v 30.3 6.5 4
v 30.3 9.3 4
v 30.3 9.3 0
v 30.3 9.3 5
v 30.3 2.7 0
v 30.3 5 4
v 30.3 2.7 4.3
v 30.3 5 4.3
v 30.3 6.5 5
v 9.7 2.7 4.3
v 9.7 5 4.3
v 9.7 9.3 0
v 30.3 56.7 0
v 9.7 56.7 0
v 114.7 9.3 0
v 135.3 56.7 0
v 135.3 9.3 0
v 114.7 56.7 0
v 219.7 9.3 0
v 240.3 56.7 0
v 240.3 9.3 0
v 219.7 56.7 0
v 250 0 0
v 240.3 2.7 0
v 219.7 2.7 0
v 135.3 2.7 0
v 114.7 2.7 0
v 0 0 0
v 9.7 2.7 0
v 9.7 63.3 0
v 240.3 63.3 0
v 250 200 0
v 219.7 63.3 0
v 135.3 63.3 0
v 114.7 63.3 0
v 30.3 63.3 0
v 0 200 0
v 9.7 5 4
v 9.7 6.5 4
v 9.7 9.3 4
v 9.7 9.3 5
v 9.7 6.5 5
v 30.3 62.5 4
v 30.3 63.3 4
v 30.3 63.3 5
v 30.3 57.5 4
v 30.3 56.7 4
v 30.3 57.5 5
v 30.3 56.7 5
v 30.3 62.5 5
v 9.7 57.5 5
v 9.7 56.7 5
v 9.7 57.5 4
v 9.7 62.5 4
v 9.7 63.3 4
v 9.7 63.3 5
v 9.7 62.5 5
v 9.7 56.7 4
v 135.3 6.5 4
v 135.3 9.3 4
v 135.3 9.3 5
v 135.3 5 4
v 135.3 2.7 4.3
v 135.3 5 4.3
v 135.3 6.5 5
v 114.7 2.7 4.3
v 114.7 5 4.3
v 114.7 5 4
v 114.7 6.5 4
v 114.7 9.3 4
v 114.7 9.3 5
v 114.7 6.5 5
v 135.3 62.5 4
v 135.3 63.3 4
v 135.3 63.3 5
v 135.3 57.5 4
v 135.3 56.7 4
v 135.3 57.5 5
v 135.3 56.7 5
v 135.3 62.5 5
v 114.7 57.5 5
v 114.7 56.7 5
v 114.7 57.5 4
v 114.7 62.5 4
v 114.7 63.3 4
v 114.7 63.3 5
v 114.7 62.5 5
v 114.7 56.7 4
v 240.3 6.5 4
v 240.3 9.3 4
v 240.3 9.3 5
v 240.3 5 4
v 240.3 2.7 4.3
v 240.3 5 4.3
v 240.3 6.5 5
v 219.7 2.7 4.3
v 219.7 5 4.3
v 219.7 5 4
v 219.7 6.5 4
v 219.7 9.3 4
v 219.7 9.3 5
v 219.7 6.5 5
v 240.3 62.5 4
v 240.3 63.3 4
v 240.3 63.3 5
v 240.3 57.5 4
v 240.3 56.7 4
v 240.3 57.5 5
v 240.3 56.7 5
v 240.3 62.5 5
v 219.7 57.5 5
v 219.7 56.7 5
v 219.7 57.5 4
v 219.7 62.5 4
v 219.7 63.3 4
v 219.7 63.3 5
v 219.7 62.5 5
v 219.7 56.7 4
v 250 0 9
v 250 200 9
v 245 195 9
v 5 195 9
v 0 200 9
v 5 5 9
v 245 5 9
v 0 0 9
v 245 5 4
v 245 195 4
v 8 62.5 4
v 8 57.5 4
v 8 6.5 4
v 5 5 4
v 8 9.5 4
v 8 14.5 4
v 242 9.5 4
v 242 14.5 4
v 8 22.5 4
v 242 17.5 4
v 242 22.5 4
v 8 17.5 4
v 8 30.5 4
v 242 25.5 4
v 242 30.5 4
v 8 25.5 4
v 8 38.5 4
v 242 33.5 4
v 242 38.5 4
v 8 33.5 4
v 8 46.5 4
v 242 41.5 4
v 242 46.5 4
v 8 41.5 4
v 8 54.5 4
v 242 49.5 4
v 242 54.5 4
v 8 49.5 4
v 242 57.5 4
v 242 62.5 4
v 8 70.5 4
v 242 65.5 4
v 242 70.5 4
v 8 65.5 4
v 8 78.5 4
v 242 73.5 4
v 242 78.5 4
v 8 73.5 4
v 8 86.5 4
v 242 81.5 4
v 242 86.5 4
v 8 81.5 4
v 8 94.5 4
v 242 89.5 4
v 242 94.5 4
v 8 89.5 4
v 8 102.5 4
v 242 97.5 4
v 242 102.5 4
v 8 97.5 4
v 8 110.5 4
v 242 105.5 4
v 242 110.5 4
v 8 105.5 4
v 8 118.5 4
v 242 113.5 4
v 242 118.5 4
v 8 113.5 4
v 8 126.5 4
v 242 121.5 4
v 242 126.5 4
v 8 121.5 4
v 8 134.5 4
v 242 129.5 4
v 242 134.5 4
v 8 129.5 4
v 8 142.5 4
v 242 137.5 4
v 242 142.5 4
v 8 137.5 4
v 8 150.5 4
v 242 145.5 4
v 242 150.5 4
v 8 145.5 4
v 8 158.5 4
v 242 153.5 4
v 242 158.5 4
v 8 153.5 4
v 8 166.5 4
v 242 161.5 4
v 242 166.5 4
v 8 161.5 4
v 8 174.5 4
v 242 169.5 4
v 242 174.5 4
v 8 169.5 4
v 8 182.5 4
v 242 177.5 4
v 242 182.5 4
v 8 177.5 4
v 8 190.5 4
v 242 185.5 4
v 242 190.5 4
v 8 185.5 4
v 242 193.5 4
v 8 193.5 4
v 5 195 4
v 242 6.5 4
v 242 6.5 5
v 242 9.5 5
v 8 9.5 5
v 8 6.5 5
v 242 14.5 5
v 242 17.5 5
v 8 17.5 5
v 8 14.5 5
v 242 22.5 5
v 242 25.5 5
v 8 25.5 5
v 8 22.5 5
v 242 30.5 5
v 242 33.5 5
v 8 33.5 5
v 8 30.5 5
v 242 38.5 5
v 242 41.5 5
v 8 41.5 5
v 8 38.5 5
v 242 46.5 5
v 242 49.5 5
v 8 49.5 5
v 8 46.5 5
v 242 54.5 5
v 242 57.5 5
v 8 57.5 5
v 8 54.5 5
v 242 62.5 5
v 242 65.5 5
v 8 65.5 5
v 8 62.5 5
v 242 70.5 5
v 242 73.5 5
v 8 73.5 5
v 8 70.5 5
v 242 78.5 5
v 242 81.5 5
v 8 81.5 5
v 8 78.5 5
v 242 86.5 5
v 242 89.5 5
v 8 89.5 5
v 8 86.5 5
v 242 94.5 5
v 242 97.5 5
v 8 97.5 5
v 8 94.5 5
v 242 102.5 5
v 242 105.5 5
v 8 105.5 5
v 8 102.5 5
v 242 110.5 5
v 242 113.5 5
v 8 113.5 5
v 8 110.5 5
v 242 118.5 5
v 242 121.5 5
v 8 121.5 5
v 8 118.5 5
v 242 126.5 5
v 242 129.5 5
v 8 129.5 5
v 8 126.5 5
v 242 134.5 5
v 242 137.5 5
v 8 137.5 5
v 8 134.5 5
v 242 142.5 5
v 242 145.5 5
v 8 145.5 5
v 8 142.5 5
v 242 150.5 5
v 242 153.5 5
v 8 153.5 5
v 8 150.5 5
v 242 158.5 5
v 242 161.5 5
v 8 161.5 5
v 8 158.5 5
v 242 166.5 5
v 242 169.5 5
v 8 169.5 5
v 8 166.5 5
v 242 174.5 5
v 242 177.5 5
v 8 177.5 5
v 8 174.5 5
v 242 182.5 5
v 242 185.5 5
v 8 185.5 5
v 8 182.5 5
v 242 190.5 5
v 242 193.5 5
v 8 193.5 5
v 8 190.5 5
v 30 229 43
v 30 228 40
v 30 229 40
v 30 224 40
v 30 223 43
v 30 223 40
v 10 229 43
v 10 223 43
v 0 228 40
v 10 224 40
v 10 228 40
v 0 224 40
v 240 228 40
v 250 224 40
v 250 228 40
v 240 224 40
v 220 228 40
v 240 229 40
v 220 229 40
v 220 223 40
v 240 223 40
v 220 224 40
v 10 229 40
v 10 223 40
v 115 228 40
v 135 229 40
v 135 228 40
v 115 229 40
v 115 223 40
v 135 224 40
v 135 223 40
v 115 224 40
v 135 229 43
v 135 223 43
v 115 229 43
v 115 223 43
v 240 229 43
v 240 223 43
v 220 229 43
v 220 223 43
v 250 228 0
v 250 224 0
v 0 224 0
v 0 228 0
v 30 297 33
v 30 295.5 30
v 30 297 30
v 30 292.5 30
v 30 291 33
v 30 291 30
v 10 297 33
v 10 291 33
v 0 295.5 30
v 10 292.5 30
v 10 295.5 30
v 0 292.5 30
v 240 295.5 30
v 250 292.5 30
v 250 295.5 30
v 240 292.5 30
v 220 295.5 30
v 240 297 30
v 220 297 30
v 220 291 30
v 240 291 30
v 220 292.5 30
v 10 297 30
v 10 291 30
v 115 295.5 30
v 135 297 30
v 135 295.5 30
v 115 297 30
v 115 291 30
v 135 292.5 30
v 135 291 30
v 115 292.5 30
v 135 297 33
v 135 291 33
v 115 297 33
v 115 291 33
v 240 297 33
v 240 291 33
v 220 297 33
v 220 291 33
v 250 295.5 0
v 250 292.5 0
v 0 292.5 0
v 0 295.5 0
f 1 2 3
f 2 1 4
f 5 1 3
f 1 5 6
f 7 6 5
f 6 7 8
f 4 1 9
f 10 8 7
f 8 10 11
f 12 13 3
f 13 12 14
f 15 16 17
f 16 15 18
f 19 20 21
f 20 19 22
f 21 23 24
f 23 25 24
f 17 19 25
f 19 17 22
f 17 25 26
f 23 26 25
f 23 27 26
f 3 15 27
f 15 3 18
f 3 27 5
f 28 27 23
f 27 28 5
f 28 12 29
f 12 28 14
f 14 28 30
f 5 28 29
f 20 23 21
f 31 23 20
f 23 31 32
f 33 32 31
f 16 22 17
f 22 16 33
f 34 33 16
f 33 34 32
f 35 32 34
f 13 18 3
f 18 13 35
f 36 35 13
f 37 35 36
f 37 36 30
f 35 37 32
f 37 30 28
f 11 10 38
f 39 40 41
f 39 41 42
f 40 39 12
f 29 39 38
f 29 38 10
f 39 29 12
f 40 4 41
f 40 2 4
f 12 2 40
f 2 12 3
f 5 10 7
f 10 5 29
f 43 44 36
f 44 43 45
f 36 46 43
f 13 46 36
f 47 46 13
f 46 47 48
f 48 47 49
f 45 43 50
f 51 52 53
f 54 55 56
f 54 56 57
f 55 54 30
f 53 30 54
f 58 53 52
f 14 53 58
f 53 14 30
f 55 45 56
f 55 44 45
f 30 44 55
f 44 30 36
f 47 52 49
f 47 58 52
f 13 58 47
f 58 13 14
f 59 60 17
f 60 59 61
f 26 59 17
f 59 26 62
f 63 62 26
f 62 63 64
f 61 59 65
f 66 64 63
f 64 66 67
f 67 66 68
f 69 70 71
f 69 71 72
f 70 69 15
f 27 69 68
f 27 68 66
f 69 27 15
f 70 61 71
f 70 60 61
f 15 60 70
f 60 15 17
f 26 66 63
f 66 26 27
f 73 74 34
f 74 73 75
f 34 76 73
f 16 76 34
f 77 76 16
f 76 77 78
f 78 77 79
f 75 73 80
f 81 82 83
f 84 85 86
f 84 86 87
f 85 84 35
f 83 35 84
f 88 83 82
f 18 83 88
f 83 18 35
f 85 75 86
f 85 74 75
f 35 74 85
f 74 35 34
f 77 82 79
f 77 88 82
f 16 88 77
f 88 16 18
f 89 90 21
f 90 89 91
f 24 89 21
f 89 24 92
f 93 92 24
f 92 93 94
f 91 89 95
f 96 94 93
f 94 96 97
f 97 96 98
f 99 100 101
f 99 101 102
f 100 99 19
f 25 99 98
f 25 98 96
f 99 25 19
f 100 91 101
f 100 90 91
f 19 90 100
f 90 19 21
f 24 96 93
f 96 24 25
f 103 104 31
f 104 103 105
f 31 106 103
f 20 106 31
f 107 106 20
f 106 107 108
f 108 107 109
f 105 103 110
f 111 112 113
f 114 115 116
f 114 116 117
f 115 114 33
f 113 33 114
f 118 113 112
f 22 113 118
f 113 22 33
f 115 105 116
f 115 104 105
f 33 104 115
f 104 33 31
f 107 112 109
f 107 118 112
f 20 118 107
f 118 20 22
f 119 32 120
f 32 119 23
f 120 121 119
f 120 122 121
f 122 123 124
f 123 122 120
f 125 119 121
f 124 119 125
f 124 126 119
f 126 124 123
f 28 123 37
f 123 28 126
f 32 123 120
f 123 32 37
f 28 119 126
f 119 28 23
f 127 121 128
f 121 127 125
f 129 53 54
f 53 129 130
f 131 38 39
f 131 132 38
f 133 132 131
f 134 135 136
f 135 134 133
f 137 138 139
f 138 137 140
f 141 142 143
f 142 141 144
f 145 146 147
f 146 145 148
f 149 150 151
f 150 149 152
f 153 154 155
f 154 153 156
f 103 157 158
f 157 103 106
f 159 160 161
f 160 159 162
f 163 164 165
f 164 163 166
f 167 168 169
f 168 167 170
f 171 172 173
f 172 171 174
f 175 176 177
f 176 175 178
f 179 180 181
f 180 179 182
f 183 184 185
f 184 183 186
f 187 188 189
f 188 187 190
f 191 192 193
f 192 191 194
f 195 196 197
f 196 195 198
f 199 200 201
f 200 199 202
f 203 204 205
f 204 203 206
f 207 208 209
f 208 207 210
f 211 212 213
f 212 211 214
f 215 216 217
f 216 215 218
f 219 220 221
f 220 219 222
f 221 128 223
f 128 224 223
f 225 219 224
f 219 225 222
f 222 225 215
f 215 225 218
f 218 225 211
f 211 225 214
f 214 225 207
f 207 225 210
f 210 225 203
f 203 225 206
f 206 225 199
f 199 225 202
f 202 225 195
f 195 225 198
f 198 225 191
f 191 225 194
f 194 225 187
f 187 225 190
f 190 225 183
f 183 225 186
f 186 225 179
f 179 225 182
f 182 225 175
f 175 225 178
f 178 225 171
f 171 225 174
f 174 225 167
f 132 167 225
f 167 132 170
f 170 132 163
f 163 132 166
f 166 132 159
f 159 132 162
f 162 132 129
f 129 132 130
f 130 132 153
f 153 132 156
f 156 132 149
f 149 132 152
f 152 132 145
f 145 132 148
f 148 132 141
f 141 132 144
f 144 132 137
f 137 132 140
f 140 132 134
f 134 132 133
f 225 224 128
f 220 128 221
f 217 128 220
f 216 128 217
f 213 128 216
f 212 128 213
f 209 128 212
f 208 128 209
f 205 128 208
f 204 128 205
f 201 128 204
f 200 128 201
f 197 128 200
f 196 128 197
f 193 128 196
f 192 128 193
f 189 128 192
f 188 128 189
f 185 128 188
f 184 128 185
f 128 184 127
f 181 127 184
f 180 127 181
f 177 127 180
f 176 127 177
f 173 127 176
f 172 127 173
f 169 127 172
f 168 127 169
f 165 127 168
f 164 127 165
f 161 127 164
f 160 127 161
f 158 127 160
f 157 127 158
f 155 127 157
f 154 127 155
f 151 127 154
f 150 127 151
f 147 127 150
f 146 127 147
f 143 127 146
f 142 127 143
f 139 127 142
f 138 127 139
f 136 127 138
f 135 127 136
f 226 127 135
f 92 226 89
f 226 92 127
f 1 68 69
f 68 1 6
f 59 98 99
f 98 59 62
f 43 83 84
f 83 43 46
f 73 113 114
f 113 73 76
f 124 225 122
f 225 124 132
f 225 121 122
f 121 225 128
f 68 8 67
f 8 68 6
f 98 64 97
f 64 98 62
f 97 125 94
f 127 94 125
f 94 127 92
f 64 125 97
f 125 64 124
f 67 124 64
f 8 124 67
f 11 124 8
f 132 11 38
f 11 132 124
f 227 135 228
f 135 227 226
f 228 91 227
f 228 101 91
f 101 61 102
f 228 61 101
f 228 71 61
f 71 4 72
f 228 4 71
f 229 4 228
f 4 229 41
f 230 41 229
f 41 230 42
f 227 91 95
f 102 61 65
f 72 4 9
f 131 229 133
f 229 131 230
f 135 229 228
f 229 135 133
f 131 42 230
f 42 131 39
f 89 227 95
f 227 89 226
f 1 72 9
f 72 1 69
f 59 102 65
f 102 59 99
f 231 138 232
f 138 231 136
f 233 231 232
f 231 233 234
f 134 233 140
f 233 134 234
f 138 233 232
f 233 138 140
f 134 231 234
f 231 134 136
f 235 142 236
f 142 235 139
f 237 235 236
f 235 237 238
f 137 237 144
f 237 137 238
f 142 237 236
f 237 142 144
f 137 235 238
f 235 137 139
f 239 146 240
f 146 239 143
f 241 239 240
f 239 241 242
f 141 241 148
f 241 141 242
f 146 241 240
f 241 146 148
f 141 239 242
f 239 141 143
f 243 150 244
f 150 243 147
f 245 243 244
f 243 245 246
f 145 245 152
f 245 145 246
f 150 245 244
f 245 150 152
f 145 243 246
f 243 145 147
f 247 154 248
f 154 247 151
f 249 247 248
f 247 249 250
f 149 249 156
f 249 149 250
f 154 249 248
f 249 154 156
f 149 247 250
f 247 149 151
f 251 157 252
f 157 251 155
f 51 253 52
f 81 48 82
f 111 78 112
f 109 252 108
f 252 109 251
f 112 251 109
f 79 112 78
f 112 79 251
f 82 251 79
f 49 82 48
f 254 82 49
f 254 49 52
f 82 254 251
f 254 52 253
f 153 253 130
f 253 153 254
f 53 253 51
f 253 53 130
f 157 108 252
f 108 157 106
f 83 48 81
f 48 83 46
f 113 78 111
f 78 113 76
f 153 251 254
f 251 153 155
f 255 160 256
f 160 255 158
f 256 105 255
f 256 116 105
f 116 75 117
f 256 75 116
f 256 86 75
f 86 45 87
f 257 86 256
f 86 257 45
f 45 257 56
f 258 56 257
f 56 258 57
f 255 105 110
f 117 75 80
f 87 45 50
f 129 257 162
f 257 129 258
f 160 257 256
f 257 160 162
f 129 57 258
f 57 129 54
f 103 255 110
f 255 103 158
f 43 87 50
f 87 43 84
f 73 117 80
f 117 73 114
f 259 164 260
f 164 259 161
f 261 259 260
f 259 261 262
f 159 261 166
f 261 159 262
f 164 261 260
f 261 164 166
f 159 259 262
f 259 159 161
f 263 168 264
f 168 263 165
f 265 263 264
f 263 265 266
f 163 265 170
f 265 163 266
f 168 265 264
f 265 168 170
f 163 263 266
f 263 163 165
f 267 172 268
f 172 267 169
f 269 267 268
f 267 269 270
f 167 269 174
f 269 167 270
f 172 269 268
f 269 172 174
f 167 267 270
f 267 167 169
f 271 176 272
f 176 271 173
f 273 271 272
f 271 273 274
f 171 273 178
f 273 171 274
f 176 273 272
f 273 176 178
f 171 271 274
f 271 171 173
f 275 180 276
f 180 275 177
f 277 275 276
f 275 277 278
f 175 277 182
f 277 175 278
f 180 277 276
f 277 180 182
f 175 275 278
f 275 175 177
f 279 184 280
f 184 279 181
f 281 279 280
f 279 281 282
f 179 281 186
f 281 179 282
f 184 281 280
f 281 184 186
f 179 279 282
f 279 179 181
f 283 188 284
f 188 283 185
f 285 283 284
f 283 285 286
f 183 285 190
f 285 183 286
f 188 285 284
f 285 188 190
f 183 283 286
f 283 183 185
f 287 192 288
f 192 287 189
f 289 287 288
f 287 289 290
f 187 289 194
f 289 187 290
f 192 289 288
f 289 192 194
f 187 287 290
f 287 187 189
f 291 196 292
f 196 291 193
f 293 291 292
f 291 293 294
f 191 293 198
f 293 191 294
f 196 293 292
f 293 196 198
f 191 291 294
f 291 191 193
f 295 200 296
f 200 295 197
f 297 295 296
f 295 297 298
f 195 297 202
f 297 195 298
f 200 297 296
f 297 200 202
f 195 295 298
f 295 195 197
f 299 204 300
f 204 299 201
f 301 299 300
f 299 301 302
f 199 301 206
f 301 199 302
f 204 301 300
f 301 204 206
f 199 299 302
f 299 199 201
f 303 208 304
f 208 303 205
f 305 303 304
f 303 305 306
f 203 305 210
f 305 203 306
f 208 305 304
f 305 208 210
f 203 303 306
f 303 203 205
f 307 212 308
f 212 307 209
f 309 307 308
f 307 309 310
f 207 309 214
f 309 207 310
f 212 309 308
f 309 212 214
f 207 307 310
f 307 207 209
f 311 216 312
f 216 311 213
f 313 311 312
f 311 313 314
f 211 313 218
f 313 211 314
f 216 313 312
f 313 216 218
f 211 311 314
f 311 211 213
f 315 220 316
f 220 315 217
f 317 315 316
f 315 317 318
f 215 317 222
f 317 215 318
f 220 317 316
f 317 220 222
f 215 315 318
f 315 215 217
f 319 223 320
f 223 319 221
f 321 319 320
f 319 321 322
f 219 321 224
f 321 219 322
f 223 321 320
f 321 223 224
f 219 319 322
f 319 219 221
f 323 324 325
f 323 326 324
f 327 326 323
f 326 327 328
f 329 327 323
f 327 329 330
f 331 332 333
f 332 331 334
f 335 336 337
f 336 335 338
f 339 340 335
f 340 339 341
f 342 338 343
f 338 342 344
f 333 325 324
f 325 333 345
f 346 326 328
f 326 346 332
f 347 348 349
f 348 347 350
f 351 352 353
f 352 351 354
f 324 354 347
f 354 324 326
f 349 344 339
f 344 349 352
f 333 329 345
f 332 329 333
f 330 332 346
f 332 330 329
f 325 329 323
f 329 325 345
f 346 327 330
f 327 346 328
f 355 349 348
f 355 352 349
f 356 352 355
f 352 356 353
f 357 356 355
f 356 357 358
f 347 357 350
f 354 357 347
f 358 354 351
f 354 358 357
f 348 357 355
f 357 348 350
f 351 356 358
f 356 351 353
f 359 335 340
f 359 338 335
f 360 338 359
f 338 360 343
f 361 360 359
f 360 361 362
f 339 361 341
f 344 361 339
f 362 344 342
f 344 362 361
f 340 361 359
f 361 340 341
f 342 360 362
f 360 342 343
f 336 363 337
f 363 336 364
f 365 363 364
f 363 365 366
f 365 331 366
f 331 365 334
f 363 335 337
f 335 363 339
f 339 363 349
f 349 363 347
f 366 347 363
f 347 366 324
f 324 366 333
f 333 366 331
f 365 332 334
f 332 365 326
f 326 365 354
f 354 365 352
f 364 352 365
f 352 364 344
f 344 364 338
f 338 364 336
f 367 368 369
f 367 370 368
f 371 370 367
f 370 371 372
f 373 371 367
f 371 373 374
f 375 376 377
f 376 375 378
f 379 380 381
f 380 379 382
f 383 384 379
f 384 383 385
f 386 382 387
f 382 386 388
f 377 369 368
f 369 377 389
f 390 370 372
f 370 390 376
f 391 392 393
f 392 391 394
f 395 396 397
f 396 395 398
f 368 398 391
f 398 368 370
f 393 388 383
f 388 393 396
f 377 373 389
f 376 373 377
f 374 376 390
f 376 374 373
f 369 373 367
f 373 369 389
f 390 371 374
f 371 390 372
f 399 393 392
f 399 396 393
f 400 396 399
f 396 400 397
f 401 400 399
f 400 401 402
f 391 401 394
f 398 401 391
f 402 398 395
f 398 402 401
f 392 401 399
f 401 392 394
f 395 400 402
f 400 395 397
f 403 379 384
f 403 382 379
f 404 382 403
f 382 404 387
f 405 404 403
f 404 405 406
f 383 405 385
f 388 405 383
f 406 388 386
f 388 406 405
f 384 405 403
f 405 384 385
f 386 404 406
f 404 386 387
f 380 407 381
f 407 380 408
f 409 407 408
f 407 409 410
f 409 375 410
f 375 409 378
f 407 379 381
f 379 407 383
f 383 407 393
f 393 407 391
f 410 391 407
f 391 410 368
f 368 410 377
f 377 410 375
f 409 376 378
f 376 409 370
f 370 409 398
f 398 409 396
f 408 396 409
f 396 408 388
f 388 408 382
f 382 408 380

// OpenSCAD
// file: BOSL2/std.scad
// Minimal BOSL2 compatibility shim for bundled gallery models.
// It implements only the helpers used by the imported OpenSCAD projects.

CENTER = [0, 0, 0];
BOTTOM = [0, 0, -1];
TOP = [0, 0, 1];
LEFT = [-1, 0, 0];
RIGHT = [1, 0, 0];
FRONT = [0, -1, 0];
BACK = [0, 1, 0];

module up(z=0) {
    translate([0, 0, z]) children();
}

module down(z=0) {
    translate([0, 0, -z]) children();
}

module attach(anchor=CENTER) {
    children();
}

module cuboid(size=[1, 1, 1], anchor=CENTER) {
    center = anchor == CENTER;
    translate(center ? [0, 0, 0] : [0, 0, size[2] / 2])
        cube(size, center=true);
    children();
}

module xcyl(h=1, r=1, anchor=CENTER) {
    center = anchor == CENTER;
    translate(center ? [0, 0, 0] : [h / 2, 0, 0])
        rotate([0, 90, 0])
            cylinder(h=h, r=r, center=true);
}
// main file
// BOSL2 für sauberes Rounding
include <BOSL2/std.scad>;

//
// Wohnmobil-Fensterbank
// - Oben: Platte + optional umlaufender Rand + BOSL2-Rundung oben an allen 4 Außenkanten
// - Oben: optional Anti-Rutsch-Rifflung auf der Grundfläche (ohne die Stecklöcher)
// - Unten: zwei Brackets zum Einstecken (mit Steck-Clips + Löchern in der Platte)
// - Brackets optional abnehmbar für optimalen Druck
// Alle Maße in mm
//

// ---------------- Basismaße ----------------

// Unterplatte
shelf_width        = 250;   // Breite (X)
shelf_depth        = 200;   // Tiefe (Y)
shelf_thickness    = 4;     // Dicke der Platte

// Umlaufender Rand auf der OBERSEITE
rim_enabled        = true;  // Rand an/aus
rim_height         = 5;     // Höhe des Randes über der Platte
rim_width          = 5;     // Breite des Randes nach innen

// BOSL2-Rundung (oben außen)
front_radius       = 6;     // 0 = keine Rundung, >0 = Radius an allen oberen Außenkanten

// Fensterbank, auf die aufgeklippt wird
board_thickness    = 50;    // Abstand zwischen den INNENflächen der beiden Halter
fit_clearance      = 0.5;   // Spiel für die Klemmung (additiv zur board_thickness)

// Äußerer Halter (fensterseitig)
outer_br_height    = 40;    // Höhe des Halters
outer_br_thickness = 4;     // Dicke in Y

// Innerer Halter (raumseitig)
inner_br_height    = 30;    // Höhe des Halters
inner_br_thickness = 3;     // Dicke in Y

// Anti-Rutsch-Rifflung
anti_slip_enabled    = true;  // Anti-Rutsch an/aus
anti_ridge_height    = 1.0;   // Höhe der Rillen über der Grundfläche
anti_ridge_width     = 3.0;   // Breite einer Rille in Y-Richtung
anti_ridge_spacing   = 8.0;   // Abstand von Rillenmitte zu Rillenmitte in Y-Richtung
anti_ridge_margin    = 3.0;   // Abstand zur Innenkante des Randes bzw. Plattenrand

// Brackets separat zum Drucken anordnen?
brackets_detached    = true;  // false = Brackets in Einbauposition, true = separat neben der Platte

// Steg hinten an der Platte, bevor die äußeren Löcher beginnen
back_steg            = 4.0;   // Materialstärke zwischen Plattenende (y=0) und Beginn des äußeren Brackets

// ---------------- Clips / Steckverbindung ----------------

// Anzahl der Stecknasen pro Bracket
plug_count           = 3;     // z.B. 2 oder 3

// Maße der Stecknasen (am Bracket)
plug_width_x         = 20;    // Länge der Nase in X-Richtung
plug_depth_y         = 6;     // Tiefe in Y-Richtung (in den Bracket hinein)
plug_height_z        = 3.0;   // Höhe der Nase, die in die Platte hineinragt

// Löcher in der Platte sind etwas größer:
plug_clearance       = 0.3;   // Toleranz (wird auf beide Seiten draufgeschlagen)
plug_margin_x        = 10.0;  // Abstand zu den Seiten in X


// =============================================================
// Abgeleitete Maße / gemeinsame Positionierungsfunktionen
// =============================================================

// FIX #1: innerer Bracket-Offset (korrigiert)
// Ziel: Abstand der INNENFLÄCHEN = board_thickness + fit_clearance
// Außenbracket liegt bei y = back_steg .. back_steg+outer_br_thickness
// Innenfläche außen = back_steg + outer_br_thickness
// Innenfläche innen = inner_y0
// => inner_y0 = back_steg + outer_br_thickness + board_thickness + fit_clearance
inner_y0 = back_steg + outer_br_thickness + board_thickness + fit_clearance;

// Gemeinsamer X-Schritt (zentriert über Plug-Geometrie, nicht über Loch-Geometrie)
step_x = (plug_count > 1)
  ? ( (shelf_width - 2*plug_margin_x - plug_width_x) / (plug_count - 1) )
  : 0;

// Gemeinsame X-Zentren der Plugs/Löcher
function x_center(i) = plug_margin_x + plug_width_x/2 + i*step_x;


// =============================================================
// Hilfs-Module: Stecklöcher / Stecknasen
// =============================================================

// Stecklöcher in der Platte (für beide Brackets)
module plug_holes() {
    // Hole-Höhe: komplett durch die Platte
    hole_h = shelf_thickness + 0.3;

    // Lochgrößen (mit Clearance)
    hole_w = plug_width_x  + 2*plug_clearance;
    hole_d = plug_depth_y  + 2*plug_clearance;

    // ---------- Äußerer Bracket: Löcher mit hinterem Steg ----------
    outer_y_center = back_steg + outer_br_thickness / 2;
    outer_y0_hole  = outer_y_center - hole_d/2;

    // ---------- Innerer Bracket ----------
    inner_y_center = inner_y0 + inner_br_thickness / 2;
    inner_y0_hole  = inner_y_center - hole_d/2;

    for (i = [0 : plug_count-1]) {
        xc = x_center(i);

        // Loch für äußeren Bracket (zentriert in X)
        translate([xc - hole_w/2, outer_y0_hole, 0])
            cube([hole_w, hole_d, hole_h], center = false);

        // Loch für inneren Bracket (zentriert in X)
        translate([xc - hole_w/2, inner_y0_hole, 0])
            cube([hole_w, hole_d, hole_h], center = false);
    }
}

// Maske für die Rillen: gleiche XY wie die Löcher, aber nur im Bereich der Anti-Slip-Höhe
module plug_holes_mask_for_ridges() {
    // Lochgrößen (mit Clearance), identisch wie in plug_holes()
    hole_w = plug_width_x  + 2*plug_clearance;
    hole_d = plug_depth_y  + 2*plug_clearance;

    outer_y_center = back_steg + outer_br_thickness / 2;
    outer_y0_hole  = outer_y_center - hole_d/2;

    inner_y_center = inner_y0 + inner_br_thickness / 2;
    inner_y0_hole  = inner_y_center - hole_d/2;

    // Maske nur im Bereich oberhalb der Platte, wo die Rillen sind
    top_z  = shelf_thickness;
    mask_h = anti_ridge_height + 1.0;  // etwas höher als die Rillen

    for (i = [0 : plug_count-1]) {
        xc = x_center(i);

        // Maskenblock über äußerem Loch
        translate([xc - hole_w/2, outer_y0_hole, top_z - 0.1])
            cube([hole_w, hole_d, mask_h], center = false);

        // Maskenblock über innerem Loch
        translate([xc - hole_w/2, inner_y0_hole, top_z - 0.1])
            cube([hole_w, hole_d, mask_h], center = false);
    }
}

// Stecknasen am äußeren Bracket (in Einbaukoordinaten)
module outer_bracket_plugs() {
    outer_y_center = back_steg + outer_br_thickness / 2;
    plug_y0        = outer_y_center - plug_depth_y / 2;

    for (i = [0 : plug_count-1]) {
        xc = x_center(i);
        translate([xc - plug_width_x/2, plug_y0, 0])
            cube([plug_width_x, plug_depth_y, plug_height_z], center = false);
    }
}

// Stecknasen am inneren Bracket (in Einbaukoordinaten)
module inner_bracket_plugs() {
    inner_y_center = inner_y0 + inner_br_thickness / 2;
    plug_y0        = inner_y_center - plug_depth_y / 2;

    for (i = [0 : plug_count-1]) {
        xc = x_center(i);
        translate([xc - plug_width_x/2, plug_y0, 0])
            cube([plug_width_x, plug_depth_y, plug_height_z], center = false);
    }
}


// =============================================================
// Grundplatte + Rand + Anti-Rutsch
// =============================================================

// Grundplatte + optionaler Rand, noch ohne Rundung, ohne Löcher
module flat_base_with_rim_raw() {

    // Platte
    cube([shelf_width, shelf_depth, shelf_thickness], center = false);

    // Rand auf der Oberseite (nur wenn aktiviert)
    if (rim_enabled && rim_height > 0 && rim_width > 0) {
        difference() {
            // äußerer Block für den Rand
            translate([0, 0, shelf_thickness])
                cube([shelf_width, shelf_depth, rim_height], center = false);

            // Innenbereich ausschneiden, damit nur der Ring stehen bleibt
            translate([rim_width, rim_width, shelf_thickness - 0.1])
                cube([shelf_width - 2*rim_width,
                      shelf_depth - 2*rim_width,
                      rim_height + 0.2], center = false);
        }
    }
}

// Anti-Rutsch-Rifflung auf der Grundfläche (oberhalb der Platte),
// aber ausgespart über den Stecklöchern.
module anti_slip_pattern() {
    if (anti_slip_enabled) {

        // Oberseite der Platte
        top_z = shelf_thickness;

        // Innenbereich definieren (umbenannt, damit inner_y0 für Bracket nicht überschattet wird)
        area_x0 = rim_enabled ? rim_width : 0;
        area_x1 = rim_enabled ? (shelf_width  - rim_width)  : shelf_width;
        area_y0 = rim_enabled ? rim_width : 0;
        area_y1 = rim_enabled ? (shelf_depth - rim_width) : shelf_depth;

        area_w  = area_x1 - area_x0;
        area_d  = area_y1 - area_y0;

        if (area_w > 2*anti_ridge_margin && area_d > 2*anti_ridge_margin) {

            start_y = area_y0 + anti_ridge_margin;
            end_y   = area_y1 - anti_ridge_margin;

            difference() {
                // Alle Rillen
                union() {
                    for (y = [start_y : anti_ridge_spacing : end_y]) {
                        translate([area_x0 + anti_ridge_margin,
                                   y - anti_ridge_width/2,
                                   top_z])
                            cube([
                                area_w - 2*anti_ridge_margin,
                                anti_ridge_width,
                                anti_ridge_height
                            ], center = false);
                    }
                }
                // Maske über den Stecklöchern -> dort werden die Rillen entfernt
                plug_holes_mask_for_ridges();
            }
        }
    }
}

// Grundplatte + Rand + Löcher + BOSL2-Rundung
module base_plate_with_rim() {

    // Gesamthöhe Platte + Rand
    H = shelf_thickness + (rim_enabled ? rim_height : 0);

    // Fall 1: Rand aus oder kein Radius -> einfache Platte mit Rand + Löchern + Rifflung
    if (!rim_enabled || front_radius <= 0) {
        difference() {
            flat_base_with_rim_raw();
            plug_holes();
        }
        anti_slip_pattern();
    }

    // Fall 2: Rand an + Radius > 0 -> BOSL2-cuboid als Außenform
    else {
        difference() {
            // ÄUSSERE Hülle mit Rundung
            translate([shelf_width/2, shelf_depth/2, H/2])
                cuboid(
                    [shelf_width, shelf_depth, H],
                    rounding = front_radius,
                    edges    = TOP+FRONT+BACK+LEFT+RIGHT
                );

            // Innenbereich des Randes wegschneiden
            translate([rim_width, rim_width, shelf_thickness])
                cube([
                    shelf_width  - 2*rim_width,
                    shelf_depth  - 2*rim_width,
                    rim_height + 0.2
                ], center = false);

            // Stecklöcher von unten durch die Platte
            plug_holes();
        }

        // Rifflung oben innen, mit ausgesparten Lochbereichen
        anti_slip_pattern();
    }
}


// =============================================================
// Brackets mit Steck-Clips
// =============================================================

// Äußerer Bracket in Einbaukoordinaten:
// - Körper von z=-outer_br_height .. 0
// - Stecknasen von z=0 .. plug_height_z
// - in Y ab back_steg
module outer_bracket_assembled() {
    // Körper
    translate([0, back_steg, -outer_br_height])
        cube([shelf_width, outer_br_thickness, outer_br_height], center = false);

    // Stecknasen oben
    outer_bracket_plugs();
}

// Innerer Bracket in Einbaukoordinaten
module inner_bracket_assembled() {
    // Körper
    translate([0, inner_y0, -inner_br_height])
        cube([shelf_width, inner_br_thickness, inner_br_height], center = false);

    // Stecknasen oben
    inner_bracket_plugs();
}

// Brackets in Einbauposition (Visualisierung)
module brackets_attached() {
    outer_bracket_assembled();
    inner_bracket_assembled();
}

// Brackets für separaten Druck: beide mit Unterseite auf z=0, neben die Platte gestellt
module brackets_detached_for_print() {

    offset_y = shelf_depth + 20;

    // äußerer Bracket: tiefste Stelle bei z=-outer_br_height -> um +outer_br_height anheben
    translate([0, offset_y, outer_br_height])
        outer_bracket_assembled();

    // innerer Bracket daneben
    translate([0, offset_y + outer_br_thickness + 10, inner_br_height])
        inner_bracket_assembled();
}


// =============================================================
// Gesamtes Modell
// =============================================================
module fensterbank() {
    // Grundplatte mit Rand, Rundung, Stecklöchern und Anti-Rutsch
    base_plate_with_rim();

    // Brackets je nach Modus
    if (brackets_detached) {
        brackets_detached_for_print();
    } else {
        brackets_attached();
    }
}

// Aufruf
fensterbank();
